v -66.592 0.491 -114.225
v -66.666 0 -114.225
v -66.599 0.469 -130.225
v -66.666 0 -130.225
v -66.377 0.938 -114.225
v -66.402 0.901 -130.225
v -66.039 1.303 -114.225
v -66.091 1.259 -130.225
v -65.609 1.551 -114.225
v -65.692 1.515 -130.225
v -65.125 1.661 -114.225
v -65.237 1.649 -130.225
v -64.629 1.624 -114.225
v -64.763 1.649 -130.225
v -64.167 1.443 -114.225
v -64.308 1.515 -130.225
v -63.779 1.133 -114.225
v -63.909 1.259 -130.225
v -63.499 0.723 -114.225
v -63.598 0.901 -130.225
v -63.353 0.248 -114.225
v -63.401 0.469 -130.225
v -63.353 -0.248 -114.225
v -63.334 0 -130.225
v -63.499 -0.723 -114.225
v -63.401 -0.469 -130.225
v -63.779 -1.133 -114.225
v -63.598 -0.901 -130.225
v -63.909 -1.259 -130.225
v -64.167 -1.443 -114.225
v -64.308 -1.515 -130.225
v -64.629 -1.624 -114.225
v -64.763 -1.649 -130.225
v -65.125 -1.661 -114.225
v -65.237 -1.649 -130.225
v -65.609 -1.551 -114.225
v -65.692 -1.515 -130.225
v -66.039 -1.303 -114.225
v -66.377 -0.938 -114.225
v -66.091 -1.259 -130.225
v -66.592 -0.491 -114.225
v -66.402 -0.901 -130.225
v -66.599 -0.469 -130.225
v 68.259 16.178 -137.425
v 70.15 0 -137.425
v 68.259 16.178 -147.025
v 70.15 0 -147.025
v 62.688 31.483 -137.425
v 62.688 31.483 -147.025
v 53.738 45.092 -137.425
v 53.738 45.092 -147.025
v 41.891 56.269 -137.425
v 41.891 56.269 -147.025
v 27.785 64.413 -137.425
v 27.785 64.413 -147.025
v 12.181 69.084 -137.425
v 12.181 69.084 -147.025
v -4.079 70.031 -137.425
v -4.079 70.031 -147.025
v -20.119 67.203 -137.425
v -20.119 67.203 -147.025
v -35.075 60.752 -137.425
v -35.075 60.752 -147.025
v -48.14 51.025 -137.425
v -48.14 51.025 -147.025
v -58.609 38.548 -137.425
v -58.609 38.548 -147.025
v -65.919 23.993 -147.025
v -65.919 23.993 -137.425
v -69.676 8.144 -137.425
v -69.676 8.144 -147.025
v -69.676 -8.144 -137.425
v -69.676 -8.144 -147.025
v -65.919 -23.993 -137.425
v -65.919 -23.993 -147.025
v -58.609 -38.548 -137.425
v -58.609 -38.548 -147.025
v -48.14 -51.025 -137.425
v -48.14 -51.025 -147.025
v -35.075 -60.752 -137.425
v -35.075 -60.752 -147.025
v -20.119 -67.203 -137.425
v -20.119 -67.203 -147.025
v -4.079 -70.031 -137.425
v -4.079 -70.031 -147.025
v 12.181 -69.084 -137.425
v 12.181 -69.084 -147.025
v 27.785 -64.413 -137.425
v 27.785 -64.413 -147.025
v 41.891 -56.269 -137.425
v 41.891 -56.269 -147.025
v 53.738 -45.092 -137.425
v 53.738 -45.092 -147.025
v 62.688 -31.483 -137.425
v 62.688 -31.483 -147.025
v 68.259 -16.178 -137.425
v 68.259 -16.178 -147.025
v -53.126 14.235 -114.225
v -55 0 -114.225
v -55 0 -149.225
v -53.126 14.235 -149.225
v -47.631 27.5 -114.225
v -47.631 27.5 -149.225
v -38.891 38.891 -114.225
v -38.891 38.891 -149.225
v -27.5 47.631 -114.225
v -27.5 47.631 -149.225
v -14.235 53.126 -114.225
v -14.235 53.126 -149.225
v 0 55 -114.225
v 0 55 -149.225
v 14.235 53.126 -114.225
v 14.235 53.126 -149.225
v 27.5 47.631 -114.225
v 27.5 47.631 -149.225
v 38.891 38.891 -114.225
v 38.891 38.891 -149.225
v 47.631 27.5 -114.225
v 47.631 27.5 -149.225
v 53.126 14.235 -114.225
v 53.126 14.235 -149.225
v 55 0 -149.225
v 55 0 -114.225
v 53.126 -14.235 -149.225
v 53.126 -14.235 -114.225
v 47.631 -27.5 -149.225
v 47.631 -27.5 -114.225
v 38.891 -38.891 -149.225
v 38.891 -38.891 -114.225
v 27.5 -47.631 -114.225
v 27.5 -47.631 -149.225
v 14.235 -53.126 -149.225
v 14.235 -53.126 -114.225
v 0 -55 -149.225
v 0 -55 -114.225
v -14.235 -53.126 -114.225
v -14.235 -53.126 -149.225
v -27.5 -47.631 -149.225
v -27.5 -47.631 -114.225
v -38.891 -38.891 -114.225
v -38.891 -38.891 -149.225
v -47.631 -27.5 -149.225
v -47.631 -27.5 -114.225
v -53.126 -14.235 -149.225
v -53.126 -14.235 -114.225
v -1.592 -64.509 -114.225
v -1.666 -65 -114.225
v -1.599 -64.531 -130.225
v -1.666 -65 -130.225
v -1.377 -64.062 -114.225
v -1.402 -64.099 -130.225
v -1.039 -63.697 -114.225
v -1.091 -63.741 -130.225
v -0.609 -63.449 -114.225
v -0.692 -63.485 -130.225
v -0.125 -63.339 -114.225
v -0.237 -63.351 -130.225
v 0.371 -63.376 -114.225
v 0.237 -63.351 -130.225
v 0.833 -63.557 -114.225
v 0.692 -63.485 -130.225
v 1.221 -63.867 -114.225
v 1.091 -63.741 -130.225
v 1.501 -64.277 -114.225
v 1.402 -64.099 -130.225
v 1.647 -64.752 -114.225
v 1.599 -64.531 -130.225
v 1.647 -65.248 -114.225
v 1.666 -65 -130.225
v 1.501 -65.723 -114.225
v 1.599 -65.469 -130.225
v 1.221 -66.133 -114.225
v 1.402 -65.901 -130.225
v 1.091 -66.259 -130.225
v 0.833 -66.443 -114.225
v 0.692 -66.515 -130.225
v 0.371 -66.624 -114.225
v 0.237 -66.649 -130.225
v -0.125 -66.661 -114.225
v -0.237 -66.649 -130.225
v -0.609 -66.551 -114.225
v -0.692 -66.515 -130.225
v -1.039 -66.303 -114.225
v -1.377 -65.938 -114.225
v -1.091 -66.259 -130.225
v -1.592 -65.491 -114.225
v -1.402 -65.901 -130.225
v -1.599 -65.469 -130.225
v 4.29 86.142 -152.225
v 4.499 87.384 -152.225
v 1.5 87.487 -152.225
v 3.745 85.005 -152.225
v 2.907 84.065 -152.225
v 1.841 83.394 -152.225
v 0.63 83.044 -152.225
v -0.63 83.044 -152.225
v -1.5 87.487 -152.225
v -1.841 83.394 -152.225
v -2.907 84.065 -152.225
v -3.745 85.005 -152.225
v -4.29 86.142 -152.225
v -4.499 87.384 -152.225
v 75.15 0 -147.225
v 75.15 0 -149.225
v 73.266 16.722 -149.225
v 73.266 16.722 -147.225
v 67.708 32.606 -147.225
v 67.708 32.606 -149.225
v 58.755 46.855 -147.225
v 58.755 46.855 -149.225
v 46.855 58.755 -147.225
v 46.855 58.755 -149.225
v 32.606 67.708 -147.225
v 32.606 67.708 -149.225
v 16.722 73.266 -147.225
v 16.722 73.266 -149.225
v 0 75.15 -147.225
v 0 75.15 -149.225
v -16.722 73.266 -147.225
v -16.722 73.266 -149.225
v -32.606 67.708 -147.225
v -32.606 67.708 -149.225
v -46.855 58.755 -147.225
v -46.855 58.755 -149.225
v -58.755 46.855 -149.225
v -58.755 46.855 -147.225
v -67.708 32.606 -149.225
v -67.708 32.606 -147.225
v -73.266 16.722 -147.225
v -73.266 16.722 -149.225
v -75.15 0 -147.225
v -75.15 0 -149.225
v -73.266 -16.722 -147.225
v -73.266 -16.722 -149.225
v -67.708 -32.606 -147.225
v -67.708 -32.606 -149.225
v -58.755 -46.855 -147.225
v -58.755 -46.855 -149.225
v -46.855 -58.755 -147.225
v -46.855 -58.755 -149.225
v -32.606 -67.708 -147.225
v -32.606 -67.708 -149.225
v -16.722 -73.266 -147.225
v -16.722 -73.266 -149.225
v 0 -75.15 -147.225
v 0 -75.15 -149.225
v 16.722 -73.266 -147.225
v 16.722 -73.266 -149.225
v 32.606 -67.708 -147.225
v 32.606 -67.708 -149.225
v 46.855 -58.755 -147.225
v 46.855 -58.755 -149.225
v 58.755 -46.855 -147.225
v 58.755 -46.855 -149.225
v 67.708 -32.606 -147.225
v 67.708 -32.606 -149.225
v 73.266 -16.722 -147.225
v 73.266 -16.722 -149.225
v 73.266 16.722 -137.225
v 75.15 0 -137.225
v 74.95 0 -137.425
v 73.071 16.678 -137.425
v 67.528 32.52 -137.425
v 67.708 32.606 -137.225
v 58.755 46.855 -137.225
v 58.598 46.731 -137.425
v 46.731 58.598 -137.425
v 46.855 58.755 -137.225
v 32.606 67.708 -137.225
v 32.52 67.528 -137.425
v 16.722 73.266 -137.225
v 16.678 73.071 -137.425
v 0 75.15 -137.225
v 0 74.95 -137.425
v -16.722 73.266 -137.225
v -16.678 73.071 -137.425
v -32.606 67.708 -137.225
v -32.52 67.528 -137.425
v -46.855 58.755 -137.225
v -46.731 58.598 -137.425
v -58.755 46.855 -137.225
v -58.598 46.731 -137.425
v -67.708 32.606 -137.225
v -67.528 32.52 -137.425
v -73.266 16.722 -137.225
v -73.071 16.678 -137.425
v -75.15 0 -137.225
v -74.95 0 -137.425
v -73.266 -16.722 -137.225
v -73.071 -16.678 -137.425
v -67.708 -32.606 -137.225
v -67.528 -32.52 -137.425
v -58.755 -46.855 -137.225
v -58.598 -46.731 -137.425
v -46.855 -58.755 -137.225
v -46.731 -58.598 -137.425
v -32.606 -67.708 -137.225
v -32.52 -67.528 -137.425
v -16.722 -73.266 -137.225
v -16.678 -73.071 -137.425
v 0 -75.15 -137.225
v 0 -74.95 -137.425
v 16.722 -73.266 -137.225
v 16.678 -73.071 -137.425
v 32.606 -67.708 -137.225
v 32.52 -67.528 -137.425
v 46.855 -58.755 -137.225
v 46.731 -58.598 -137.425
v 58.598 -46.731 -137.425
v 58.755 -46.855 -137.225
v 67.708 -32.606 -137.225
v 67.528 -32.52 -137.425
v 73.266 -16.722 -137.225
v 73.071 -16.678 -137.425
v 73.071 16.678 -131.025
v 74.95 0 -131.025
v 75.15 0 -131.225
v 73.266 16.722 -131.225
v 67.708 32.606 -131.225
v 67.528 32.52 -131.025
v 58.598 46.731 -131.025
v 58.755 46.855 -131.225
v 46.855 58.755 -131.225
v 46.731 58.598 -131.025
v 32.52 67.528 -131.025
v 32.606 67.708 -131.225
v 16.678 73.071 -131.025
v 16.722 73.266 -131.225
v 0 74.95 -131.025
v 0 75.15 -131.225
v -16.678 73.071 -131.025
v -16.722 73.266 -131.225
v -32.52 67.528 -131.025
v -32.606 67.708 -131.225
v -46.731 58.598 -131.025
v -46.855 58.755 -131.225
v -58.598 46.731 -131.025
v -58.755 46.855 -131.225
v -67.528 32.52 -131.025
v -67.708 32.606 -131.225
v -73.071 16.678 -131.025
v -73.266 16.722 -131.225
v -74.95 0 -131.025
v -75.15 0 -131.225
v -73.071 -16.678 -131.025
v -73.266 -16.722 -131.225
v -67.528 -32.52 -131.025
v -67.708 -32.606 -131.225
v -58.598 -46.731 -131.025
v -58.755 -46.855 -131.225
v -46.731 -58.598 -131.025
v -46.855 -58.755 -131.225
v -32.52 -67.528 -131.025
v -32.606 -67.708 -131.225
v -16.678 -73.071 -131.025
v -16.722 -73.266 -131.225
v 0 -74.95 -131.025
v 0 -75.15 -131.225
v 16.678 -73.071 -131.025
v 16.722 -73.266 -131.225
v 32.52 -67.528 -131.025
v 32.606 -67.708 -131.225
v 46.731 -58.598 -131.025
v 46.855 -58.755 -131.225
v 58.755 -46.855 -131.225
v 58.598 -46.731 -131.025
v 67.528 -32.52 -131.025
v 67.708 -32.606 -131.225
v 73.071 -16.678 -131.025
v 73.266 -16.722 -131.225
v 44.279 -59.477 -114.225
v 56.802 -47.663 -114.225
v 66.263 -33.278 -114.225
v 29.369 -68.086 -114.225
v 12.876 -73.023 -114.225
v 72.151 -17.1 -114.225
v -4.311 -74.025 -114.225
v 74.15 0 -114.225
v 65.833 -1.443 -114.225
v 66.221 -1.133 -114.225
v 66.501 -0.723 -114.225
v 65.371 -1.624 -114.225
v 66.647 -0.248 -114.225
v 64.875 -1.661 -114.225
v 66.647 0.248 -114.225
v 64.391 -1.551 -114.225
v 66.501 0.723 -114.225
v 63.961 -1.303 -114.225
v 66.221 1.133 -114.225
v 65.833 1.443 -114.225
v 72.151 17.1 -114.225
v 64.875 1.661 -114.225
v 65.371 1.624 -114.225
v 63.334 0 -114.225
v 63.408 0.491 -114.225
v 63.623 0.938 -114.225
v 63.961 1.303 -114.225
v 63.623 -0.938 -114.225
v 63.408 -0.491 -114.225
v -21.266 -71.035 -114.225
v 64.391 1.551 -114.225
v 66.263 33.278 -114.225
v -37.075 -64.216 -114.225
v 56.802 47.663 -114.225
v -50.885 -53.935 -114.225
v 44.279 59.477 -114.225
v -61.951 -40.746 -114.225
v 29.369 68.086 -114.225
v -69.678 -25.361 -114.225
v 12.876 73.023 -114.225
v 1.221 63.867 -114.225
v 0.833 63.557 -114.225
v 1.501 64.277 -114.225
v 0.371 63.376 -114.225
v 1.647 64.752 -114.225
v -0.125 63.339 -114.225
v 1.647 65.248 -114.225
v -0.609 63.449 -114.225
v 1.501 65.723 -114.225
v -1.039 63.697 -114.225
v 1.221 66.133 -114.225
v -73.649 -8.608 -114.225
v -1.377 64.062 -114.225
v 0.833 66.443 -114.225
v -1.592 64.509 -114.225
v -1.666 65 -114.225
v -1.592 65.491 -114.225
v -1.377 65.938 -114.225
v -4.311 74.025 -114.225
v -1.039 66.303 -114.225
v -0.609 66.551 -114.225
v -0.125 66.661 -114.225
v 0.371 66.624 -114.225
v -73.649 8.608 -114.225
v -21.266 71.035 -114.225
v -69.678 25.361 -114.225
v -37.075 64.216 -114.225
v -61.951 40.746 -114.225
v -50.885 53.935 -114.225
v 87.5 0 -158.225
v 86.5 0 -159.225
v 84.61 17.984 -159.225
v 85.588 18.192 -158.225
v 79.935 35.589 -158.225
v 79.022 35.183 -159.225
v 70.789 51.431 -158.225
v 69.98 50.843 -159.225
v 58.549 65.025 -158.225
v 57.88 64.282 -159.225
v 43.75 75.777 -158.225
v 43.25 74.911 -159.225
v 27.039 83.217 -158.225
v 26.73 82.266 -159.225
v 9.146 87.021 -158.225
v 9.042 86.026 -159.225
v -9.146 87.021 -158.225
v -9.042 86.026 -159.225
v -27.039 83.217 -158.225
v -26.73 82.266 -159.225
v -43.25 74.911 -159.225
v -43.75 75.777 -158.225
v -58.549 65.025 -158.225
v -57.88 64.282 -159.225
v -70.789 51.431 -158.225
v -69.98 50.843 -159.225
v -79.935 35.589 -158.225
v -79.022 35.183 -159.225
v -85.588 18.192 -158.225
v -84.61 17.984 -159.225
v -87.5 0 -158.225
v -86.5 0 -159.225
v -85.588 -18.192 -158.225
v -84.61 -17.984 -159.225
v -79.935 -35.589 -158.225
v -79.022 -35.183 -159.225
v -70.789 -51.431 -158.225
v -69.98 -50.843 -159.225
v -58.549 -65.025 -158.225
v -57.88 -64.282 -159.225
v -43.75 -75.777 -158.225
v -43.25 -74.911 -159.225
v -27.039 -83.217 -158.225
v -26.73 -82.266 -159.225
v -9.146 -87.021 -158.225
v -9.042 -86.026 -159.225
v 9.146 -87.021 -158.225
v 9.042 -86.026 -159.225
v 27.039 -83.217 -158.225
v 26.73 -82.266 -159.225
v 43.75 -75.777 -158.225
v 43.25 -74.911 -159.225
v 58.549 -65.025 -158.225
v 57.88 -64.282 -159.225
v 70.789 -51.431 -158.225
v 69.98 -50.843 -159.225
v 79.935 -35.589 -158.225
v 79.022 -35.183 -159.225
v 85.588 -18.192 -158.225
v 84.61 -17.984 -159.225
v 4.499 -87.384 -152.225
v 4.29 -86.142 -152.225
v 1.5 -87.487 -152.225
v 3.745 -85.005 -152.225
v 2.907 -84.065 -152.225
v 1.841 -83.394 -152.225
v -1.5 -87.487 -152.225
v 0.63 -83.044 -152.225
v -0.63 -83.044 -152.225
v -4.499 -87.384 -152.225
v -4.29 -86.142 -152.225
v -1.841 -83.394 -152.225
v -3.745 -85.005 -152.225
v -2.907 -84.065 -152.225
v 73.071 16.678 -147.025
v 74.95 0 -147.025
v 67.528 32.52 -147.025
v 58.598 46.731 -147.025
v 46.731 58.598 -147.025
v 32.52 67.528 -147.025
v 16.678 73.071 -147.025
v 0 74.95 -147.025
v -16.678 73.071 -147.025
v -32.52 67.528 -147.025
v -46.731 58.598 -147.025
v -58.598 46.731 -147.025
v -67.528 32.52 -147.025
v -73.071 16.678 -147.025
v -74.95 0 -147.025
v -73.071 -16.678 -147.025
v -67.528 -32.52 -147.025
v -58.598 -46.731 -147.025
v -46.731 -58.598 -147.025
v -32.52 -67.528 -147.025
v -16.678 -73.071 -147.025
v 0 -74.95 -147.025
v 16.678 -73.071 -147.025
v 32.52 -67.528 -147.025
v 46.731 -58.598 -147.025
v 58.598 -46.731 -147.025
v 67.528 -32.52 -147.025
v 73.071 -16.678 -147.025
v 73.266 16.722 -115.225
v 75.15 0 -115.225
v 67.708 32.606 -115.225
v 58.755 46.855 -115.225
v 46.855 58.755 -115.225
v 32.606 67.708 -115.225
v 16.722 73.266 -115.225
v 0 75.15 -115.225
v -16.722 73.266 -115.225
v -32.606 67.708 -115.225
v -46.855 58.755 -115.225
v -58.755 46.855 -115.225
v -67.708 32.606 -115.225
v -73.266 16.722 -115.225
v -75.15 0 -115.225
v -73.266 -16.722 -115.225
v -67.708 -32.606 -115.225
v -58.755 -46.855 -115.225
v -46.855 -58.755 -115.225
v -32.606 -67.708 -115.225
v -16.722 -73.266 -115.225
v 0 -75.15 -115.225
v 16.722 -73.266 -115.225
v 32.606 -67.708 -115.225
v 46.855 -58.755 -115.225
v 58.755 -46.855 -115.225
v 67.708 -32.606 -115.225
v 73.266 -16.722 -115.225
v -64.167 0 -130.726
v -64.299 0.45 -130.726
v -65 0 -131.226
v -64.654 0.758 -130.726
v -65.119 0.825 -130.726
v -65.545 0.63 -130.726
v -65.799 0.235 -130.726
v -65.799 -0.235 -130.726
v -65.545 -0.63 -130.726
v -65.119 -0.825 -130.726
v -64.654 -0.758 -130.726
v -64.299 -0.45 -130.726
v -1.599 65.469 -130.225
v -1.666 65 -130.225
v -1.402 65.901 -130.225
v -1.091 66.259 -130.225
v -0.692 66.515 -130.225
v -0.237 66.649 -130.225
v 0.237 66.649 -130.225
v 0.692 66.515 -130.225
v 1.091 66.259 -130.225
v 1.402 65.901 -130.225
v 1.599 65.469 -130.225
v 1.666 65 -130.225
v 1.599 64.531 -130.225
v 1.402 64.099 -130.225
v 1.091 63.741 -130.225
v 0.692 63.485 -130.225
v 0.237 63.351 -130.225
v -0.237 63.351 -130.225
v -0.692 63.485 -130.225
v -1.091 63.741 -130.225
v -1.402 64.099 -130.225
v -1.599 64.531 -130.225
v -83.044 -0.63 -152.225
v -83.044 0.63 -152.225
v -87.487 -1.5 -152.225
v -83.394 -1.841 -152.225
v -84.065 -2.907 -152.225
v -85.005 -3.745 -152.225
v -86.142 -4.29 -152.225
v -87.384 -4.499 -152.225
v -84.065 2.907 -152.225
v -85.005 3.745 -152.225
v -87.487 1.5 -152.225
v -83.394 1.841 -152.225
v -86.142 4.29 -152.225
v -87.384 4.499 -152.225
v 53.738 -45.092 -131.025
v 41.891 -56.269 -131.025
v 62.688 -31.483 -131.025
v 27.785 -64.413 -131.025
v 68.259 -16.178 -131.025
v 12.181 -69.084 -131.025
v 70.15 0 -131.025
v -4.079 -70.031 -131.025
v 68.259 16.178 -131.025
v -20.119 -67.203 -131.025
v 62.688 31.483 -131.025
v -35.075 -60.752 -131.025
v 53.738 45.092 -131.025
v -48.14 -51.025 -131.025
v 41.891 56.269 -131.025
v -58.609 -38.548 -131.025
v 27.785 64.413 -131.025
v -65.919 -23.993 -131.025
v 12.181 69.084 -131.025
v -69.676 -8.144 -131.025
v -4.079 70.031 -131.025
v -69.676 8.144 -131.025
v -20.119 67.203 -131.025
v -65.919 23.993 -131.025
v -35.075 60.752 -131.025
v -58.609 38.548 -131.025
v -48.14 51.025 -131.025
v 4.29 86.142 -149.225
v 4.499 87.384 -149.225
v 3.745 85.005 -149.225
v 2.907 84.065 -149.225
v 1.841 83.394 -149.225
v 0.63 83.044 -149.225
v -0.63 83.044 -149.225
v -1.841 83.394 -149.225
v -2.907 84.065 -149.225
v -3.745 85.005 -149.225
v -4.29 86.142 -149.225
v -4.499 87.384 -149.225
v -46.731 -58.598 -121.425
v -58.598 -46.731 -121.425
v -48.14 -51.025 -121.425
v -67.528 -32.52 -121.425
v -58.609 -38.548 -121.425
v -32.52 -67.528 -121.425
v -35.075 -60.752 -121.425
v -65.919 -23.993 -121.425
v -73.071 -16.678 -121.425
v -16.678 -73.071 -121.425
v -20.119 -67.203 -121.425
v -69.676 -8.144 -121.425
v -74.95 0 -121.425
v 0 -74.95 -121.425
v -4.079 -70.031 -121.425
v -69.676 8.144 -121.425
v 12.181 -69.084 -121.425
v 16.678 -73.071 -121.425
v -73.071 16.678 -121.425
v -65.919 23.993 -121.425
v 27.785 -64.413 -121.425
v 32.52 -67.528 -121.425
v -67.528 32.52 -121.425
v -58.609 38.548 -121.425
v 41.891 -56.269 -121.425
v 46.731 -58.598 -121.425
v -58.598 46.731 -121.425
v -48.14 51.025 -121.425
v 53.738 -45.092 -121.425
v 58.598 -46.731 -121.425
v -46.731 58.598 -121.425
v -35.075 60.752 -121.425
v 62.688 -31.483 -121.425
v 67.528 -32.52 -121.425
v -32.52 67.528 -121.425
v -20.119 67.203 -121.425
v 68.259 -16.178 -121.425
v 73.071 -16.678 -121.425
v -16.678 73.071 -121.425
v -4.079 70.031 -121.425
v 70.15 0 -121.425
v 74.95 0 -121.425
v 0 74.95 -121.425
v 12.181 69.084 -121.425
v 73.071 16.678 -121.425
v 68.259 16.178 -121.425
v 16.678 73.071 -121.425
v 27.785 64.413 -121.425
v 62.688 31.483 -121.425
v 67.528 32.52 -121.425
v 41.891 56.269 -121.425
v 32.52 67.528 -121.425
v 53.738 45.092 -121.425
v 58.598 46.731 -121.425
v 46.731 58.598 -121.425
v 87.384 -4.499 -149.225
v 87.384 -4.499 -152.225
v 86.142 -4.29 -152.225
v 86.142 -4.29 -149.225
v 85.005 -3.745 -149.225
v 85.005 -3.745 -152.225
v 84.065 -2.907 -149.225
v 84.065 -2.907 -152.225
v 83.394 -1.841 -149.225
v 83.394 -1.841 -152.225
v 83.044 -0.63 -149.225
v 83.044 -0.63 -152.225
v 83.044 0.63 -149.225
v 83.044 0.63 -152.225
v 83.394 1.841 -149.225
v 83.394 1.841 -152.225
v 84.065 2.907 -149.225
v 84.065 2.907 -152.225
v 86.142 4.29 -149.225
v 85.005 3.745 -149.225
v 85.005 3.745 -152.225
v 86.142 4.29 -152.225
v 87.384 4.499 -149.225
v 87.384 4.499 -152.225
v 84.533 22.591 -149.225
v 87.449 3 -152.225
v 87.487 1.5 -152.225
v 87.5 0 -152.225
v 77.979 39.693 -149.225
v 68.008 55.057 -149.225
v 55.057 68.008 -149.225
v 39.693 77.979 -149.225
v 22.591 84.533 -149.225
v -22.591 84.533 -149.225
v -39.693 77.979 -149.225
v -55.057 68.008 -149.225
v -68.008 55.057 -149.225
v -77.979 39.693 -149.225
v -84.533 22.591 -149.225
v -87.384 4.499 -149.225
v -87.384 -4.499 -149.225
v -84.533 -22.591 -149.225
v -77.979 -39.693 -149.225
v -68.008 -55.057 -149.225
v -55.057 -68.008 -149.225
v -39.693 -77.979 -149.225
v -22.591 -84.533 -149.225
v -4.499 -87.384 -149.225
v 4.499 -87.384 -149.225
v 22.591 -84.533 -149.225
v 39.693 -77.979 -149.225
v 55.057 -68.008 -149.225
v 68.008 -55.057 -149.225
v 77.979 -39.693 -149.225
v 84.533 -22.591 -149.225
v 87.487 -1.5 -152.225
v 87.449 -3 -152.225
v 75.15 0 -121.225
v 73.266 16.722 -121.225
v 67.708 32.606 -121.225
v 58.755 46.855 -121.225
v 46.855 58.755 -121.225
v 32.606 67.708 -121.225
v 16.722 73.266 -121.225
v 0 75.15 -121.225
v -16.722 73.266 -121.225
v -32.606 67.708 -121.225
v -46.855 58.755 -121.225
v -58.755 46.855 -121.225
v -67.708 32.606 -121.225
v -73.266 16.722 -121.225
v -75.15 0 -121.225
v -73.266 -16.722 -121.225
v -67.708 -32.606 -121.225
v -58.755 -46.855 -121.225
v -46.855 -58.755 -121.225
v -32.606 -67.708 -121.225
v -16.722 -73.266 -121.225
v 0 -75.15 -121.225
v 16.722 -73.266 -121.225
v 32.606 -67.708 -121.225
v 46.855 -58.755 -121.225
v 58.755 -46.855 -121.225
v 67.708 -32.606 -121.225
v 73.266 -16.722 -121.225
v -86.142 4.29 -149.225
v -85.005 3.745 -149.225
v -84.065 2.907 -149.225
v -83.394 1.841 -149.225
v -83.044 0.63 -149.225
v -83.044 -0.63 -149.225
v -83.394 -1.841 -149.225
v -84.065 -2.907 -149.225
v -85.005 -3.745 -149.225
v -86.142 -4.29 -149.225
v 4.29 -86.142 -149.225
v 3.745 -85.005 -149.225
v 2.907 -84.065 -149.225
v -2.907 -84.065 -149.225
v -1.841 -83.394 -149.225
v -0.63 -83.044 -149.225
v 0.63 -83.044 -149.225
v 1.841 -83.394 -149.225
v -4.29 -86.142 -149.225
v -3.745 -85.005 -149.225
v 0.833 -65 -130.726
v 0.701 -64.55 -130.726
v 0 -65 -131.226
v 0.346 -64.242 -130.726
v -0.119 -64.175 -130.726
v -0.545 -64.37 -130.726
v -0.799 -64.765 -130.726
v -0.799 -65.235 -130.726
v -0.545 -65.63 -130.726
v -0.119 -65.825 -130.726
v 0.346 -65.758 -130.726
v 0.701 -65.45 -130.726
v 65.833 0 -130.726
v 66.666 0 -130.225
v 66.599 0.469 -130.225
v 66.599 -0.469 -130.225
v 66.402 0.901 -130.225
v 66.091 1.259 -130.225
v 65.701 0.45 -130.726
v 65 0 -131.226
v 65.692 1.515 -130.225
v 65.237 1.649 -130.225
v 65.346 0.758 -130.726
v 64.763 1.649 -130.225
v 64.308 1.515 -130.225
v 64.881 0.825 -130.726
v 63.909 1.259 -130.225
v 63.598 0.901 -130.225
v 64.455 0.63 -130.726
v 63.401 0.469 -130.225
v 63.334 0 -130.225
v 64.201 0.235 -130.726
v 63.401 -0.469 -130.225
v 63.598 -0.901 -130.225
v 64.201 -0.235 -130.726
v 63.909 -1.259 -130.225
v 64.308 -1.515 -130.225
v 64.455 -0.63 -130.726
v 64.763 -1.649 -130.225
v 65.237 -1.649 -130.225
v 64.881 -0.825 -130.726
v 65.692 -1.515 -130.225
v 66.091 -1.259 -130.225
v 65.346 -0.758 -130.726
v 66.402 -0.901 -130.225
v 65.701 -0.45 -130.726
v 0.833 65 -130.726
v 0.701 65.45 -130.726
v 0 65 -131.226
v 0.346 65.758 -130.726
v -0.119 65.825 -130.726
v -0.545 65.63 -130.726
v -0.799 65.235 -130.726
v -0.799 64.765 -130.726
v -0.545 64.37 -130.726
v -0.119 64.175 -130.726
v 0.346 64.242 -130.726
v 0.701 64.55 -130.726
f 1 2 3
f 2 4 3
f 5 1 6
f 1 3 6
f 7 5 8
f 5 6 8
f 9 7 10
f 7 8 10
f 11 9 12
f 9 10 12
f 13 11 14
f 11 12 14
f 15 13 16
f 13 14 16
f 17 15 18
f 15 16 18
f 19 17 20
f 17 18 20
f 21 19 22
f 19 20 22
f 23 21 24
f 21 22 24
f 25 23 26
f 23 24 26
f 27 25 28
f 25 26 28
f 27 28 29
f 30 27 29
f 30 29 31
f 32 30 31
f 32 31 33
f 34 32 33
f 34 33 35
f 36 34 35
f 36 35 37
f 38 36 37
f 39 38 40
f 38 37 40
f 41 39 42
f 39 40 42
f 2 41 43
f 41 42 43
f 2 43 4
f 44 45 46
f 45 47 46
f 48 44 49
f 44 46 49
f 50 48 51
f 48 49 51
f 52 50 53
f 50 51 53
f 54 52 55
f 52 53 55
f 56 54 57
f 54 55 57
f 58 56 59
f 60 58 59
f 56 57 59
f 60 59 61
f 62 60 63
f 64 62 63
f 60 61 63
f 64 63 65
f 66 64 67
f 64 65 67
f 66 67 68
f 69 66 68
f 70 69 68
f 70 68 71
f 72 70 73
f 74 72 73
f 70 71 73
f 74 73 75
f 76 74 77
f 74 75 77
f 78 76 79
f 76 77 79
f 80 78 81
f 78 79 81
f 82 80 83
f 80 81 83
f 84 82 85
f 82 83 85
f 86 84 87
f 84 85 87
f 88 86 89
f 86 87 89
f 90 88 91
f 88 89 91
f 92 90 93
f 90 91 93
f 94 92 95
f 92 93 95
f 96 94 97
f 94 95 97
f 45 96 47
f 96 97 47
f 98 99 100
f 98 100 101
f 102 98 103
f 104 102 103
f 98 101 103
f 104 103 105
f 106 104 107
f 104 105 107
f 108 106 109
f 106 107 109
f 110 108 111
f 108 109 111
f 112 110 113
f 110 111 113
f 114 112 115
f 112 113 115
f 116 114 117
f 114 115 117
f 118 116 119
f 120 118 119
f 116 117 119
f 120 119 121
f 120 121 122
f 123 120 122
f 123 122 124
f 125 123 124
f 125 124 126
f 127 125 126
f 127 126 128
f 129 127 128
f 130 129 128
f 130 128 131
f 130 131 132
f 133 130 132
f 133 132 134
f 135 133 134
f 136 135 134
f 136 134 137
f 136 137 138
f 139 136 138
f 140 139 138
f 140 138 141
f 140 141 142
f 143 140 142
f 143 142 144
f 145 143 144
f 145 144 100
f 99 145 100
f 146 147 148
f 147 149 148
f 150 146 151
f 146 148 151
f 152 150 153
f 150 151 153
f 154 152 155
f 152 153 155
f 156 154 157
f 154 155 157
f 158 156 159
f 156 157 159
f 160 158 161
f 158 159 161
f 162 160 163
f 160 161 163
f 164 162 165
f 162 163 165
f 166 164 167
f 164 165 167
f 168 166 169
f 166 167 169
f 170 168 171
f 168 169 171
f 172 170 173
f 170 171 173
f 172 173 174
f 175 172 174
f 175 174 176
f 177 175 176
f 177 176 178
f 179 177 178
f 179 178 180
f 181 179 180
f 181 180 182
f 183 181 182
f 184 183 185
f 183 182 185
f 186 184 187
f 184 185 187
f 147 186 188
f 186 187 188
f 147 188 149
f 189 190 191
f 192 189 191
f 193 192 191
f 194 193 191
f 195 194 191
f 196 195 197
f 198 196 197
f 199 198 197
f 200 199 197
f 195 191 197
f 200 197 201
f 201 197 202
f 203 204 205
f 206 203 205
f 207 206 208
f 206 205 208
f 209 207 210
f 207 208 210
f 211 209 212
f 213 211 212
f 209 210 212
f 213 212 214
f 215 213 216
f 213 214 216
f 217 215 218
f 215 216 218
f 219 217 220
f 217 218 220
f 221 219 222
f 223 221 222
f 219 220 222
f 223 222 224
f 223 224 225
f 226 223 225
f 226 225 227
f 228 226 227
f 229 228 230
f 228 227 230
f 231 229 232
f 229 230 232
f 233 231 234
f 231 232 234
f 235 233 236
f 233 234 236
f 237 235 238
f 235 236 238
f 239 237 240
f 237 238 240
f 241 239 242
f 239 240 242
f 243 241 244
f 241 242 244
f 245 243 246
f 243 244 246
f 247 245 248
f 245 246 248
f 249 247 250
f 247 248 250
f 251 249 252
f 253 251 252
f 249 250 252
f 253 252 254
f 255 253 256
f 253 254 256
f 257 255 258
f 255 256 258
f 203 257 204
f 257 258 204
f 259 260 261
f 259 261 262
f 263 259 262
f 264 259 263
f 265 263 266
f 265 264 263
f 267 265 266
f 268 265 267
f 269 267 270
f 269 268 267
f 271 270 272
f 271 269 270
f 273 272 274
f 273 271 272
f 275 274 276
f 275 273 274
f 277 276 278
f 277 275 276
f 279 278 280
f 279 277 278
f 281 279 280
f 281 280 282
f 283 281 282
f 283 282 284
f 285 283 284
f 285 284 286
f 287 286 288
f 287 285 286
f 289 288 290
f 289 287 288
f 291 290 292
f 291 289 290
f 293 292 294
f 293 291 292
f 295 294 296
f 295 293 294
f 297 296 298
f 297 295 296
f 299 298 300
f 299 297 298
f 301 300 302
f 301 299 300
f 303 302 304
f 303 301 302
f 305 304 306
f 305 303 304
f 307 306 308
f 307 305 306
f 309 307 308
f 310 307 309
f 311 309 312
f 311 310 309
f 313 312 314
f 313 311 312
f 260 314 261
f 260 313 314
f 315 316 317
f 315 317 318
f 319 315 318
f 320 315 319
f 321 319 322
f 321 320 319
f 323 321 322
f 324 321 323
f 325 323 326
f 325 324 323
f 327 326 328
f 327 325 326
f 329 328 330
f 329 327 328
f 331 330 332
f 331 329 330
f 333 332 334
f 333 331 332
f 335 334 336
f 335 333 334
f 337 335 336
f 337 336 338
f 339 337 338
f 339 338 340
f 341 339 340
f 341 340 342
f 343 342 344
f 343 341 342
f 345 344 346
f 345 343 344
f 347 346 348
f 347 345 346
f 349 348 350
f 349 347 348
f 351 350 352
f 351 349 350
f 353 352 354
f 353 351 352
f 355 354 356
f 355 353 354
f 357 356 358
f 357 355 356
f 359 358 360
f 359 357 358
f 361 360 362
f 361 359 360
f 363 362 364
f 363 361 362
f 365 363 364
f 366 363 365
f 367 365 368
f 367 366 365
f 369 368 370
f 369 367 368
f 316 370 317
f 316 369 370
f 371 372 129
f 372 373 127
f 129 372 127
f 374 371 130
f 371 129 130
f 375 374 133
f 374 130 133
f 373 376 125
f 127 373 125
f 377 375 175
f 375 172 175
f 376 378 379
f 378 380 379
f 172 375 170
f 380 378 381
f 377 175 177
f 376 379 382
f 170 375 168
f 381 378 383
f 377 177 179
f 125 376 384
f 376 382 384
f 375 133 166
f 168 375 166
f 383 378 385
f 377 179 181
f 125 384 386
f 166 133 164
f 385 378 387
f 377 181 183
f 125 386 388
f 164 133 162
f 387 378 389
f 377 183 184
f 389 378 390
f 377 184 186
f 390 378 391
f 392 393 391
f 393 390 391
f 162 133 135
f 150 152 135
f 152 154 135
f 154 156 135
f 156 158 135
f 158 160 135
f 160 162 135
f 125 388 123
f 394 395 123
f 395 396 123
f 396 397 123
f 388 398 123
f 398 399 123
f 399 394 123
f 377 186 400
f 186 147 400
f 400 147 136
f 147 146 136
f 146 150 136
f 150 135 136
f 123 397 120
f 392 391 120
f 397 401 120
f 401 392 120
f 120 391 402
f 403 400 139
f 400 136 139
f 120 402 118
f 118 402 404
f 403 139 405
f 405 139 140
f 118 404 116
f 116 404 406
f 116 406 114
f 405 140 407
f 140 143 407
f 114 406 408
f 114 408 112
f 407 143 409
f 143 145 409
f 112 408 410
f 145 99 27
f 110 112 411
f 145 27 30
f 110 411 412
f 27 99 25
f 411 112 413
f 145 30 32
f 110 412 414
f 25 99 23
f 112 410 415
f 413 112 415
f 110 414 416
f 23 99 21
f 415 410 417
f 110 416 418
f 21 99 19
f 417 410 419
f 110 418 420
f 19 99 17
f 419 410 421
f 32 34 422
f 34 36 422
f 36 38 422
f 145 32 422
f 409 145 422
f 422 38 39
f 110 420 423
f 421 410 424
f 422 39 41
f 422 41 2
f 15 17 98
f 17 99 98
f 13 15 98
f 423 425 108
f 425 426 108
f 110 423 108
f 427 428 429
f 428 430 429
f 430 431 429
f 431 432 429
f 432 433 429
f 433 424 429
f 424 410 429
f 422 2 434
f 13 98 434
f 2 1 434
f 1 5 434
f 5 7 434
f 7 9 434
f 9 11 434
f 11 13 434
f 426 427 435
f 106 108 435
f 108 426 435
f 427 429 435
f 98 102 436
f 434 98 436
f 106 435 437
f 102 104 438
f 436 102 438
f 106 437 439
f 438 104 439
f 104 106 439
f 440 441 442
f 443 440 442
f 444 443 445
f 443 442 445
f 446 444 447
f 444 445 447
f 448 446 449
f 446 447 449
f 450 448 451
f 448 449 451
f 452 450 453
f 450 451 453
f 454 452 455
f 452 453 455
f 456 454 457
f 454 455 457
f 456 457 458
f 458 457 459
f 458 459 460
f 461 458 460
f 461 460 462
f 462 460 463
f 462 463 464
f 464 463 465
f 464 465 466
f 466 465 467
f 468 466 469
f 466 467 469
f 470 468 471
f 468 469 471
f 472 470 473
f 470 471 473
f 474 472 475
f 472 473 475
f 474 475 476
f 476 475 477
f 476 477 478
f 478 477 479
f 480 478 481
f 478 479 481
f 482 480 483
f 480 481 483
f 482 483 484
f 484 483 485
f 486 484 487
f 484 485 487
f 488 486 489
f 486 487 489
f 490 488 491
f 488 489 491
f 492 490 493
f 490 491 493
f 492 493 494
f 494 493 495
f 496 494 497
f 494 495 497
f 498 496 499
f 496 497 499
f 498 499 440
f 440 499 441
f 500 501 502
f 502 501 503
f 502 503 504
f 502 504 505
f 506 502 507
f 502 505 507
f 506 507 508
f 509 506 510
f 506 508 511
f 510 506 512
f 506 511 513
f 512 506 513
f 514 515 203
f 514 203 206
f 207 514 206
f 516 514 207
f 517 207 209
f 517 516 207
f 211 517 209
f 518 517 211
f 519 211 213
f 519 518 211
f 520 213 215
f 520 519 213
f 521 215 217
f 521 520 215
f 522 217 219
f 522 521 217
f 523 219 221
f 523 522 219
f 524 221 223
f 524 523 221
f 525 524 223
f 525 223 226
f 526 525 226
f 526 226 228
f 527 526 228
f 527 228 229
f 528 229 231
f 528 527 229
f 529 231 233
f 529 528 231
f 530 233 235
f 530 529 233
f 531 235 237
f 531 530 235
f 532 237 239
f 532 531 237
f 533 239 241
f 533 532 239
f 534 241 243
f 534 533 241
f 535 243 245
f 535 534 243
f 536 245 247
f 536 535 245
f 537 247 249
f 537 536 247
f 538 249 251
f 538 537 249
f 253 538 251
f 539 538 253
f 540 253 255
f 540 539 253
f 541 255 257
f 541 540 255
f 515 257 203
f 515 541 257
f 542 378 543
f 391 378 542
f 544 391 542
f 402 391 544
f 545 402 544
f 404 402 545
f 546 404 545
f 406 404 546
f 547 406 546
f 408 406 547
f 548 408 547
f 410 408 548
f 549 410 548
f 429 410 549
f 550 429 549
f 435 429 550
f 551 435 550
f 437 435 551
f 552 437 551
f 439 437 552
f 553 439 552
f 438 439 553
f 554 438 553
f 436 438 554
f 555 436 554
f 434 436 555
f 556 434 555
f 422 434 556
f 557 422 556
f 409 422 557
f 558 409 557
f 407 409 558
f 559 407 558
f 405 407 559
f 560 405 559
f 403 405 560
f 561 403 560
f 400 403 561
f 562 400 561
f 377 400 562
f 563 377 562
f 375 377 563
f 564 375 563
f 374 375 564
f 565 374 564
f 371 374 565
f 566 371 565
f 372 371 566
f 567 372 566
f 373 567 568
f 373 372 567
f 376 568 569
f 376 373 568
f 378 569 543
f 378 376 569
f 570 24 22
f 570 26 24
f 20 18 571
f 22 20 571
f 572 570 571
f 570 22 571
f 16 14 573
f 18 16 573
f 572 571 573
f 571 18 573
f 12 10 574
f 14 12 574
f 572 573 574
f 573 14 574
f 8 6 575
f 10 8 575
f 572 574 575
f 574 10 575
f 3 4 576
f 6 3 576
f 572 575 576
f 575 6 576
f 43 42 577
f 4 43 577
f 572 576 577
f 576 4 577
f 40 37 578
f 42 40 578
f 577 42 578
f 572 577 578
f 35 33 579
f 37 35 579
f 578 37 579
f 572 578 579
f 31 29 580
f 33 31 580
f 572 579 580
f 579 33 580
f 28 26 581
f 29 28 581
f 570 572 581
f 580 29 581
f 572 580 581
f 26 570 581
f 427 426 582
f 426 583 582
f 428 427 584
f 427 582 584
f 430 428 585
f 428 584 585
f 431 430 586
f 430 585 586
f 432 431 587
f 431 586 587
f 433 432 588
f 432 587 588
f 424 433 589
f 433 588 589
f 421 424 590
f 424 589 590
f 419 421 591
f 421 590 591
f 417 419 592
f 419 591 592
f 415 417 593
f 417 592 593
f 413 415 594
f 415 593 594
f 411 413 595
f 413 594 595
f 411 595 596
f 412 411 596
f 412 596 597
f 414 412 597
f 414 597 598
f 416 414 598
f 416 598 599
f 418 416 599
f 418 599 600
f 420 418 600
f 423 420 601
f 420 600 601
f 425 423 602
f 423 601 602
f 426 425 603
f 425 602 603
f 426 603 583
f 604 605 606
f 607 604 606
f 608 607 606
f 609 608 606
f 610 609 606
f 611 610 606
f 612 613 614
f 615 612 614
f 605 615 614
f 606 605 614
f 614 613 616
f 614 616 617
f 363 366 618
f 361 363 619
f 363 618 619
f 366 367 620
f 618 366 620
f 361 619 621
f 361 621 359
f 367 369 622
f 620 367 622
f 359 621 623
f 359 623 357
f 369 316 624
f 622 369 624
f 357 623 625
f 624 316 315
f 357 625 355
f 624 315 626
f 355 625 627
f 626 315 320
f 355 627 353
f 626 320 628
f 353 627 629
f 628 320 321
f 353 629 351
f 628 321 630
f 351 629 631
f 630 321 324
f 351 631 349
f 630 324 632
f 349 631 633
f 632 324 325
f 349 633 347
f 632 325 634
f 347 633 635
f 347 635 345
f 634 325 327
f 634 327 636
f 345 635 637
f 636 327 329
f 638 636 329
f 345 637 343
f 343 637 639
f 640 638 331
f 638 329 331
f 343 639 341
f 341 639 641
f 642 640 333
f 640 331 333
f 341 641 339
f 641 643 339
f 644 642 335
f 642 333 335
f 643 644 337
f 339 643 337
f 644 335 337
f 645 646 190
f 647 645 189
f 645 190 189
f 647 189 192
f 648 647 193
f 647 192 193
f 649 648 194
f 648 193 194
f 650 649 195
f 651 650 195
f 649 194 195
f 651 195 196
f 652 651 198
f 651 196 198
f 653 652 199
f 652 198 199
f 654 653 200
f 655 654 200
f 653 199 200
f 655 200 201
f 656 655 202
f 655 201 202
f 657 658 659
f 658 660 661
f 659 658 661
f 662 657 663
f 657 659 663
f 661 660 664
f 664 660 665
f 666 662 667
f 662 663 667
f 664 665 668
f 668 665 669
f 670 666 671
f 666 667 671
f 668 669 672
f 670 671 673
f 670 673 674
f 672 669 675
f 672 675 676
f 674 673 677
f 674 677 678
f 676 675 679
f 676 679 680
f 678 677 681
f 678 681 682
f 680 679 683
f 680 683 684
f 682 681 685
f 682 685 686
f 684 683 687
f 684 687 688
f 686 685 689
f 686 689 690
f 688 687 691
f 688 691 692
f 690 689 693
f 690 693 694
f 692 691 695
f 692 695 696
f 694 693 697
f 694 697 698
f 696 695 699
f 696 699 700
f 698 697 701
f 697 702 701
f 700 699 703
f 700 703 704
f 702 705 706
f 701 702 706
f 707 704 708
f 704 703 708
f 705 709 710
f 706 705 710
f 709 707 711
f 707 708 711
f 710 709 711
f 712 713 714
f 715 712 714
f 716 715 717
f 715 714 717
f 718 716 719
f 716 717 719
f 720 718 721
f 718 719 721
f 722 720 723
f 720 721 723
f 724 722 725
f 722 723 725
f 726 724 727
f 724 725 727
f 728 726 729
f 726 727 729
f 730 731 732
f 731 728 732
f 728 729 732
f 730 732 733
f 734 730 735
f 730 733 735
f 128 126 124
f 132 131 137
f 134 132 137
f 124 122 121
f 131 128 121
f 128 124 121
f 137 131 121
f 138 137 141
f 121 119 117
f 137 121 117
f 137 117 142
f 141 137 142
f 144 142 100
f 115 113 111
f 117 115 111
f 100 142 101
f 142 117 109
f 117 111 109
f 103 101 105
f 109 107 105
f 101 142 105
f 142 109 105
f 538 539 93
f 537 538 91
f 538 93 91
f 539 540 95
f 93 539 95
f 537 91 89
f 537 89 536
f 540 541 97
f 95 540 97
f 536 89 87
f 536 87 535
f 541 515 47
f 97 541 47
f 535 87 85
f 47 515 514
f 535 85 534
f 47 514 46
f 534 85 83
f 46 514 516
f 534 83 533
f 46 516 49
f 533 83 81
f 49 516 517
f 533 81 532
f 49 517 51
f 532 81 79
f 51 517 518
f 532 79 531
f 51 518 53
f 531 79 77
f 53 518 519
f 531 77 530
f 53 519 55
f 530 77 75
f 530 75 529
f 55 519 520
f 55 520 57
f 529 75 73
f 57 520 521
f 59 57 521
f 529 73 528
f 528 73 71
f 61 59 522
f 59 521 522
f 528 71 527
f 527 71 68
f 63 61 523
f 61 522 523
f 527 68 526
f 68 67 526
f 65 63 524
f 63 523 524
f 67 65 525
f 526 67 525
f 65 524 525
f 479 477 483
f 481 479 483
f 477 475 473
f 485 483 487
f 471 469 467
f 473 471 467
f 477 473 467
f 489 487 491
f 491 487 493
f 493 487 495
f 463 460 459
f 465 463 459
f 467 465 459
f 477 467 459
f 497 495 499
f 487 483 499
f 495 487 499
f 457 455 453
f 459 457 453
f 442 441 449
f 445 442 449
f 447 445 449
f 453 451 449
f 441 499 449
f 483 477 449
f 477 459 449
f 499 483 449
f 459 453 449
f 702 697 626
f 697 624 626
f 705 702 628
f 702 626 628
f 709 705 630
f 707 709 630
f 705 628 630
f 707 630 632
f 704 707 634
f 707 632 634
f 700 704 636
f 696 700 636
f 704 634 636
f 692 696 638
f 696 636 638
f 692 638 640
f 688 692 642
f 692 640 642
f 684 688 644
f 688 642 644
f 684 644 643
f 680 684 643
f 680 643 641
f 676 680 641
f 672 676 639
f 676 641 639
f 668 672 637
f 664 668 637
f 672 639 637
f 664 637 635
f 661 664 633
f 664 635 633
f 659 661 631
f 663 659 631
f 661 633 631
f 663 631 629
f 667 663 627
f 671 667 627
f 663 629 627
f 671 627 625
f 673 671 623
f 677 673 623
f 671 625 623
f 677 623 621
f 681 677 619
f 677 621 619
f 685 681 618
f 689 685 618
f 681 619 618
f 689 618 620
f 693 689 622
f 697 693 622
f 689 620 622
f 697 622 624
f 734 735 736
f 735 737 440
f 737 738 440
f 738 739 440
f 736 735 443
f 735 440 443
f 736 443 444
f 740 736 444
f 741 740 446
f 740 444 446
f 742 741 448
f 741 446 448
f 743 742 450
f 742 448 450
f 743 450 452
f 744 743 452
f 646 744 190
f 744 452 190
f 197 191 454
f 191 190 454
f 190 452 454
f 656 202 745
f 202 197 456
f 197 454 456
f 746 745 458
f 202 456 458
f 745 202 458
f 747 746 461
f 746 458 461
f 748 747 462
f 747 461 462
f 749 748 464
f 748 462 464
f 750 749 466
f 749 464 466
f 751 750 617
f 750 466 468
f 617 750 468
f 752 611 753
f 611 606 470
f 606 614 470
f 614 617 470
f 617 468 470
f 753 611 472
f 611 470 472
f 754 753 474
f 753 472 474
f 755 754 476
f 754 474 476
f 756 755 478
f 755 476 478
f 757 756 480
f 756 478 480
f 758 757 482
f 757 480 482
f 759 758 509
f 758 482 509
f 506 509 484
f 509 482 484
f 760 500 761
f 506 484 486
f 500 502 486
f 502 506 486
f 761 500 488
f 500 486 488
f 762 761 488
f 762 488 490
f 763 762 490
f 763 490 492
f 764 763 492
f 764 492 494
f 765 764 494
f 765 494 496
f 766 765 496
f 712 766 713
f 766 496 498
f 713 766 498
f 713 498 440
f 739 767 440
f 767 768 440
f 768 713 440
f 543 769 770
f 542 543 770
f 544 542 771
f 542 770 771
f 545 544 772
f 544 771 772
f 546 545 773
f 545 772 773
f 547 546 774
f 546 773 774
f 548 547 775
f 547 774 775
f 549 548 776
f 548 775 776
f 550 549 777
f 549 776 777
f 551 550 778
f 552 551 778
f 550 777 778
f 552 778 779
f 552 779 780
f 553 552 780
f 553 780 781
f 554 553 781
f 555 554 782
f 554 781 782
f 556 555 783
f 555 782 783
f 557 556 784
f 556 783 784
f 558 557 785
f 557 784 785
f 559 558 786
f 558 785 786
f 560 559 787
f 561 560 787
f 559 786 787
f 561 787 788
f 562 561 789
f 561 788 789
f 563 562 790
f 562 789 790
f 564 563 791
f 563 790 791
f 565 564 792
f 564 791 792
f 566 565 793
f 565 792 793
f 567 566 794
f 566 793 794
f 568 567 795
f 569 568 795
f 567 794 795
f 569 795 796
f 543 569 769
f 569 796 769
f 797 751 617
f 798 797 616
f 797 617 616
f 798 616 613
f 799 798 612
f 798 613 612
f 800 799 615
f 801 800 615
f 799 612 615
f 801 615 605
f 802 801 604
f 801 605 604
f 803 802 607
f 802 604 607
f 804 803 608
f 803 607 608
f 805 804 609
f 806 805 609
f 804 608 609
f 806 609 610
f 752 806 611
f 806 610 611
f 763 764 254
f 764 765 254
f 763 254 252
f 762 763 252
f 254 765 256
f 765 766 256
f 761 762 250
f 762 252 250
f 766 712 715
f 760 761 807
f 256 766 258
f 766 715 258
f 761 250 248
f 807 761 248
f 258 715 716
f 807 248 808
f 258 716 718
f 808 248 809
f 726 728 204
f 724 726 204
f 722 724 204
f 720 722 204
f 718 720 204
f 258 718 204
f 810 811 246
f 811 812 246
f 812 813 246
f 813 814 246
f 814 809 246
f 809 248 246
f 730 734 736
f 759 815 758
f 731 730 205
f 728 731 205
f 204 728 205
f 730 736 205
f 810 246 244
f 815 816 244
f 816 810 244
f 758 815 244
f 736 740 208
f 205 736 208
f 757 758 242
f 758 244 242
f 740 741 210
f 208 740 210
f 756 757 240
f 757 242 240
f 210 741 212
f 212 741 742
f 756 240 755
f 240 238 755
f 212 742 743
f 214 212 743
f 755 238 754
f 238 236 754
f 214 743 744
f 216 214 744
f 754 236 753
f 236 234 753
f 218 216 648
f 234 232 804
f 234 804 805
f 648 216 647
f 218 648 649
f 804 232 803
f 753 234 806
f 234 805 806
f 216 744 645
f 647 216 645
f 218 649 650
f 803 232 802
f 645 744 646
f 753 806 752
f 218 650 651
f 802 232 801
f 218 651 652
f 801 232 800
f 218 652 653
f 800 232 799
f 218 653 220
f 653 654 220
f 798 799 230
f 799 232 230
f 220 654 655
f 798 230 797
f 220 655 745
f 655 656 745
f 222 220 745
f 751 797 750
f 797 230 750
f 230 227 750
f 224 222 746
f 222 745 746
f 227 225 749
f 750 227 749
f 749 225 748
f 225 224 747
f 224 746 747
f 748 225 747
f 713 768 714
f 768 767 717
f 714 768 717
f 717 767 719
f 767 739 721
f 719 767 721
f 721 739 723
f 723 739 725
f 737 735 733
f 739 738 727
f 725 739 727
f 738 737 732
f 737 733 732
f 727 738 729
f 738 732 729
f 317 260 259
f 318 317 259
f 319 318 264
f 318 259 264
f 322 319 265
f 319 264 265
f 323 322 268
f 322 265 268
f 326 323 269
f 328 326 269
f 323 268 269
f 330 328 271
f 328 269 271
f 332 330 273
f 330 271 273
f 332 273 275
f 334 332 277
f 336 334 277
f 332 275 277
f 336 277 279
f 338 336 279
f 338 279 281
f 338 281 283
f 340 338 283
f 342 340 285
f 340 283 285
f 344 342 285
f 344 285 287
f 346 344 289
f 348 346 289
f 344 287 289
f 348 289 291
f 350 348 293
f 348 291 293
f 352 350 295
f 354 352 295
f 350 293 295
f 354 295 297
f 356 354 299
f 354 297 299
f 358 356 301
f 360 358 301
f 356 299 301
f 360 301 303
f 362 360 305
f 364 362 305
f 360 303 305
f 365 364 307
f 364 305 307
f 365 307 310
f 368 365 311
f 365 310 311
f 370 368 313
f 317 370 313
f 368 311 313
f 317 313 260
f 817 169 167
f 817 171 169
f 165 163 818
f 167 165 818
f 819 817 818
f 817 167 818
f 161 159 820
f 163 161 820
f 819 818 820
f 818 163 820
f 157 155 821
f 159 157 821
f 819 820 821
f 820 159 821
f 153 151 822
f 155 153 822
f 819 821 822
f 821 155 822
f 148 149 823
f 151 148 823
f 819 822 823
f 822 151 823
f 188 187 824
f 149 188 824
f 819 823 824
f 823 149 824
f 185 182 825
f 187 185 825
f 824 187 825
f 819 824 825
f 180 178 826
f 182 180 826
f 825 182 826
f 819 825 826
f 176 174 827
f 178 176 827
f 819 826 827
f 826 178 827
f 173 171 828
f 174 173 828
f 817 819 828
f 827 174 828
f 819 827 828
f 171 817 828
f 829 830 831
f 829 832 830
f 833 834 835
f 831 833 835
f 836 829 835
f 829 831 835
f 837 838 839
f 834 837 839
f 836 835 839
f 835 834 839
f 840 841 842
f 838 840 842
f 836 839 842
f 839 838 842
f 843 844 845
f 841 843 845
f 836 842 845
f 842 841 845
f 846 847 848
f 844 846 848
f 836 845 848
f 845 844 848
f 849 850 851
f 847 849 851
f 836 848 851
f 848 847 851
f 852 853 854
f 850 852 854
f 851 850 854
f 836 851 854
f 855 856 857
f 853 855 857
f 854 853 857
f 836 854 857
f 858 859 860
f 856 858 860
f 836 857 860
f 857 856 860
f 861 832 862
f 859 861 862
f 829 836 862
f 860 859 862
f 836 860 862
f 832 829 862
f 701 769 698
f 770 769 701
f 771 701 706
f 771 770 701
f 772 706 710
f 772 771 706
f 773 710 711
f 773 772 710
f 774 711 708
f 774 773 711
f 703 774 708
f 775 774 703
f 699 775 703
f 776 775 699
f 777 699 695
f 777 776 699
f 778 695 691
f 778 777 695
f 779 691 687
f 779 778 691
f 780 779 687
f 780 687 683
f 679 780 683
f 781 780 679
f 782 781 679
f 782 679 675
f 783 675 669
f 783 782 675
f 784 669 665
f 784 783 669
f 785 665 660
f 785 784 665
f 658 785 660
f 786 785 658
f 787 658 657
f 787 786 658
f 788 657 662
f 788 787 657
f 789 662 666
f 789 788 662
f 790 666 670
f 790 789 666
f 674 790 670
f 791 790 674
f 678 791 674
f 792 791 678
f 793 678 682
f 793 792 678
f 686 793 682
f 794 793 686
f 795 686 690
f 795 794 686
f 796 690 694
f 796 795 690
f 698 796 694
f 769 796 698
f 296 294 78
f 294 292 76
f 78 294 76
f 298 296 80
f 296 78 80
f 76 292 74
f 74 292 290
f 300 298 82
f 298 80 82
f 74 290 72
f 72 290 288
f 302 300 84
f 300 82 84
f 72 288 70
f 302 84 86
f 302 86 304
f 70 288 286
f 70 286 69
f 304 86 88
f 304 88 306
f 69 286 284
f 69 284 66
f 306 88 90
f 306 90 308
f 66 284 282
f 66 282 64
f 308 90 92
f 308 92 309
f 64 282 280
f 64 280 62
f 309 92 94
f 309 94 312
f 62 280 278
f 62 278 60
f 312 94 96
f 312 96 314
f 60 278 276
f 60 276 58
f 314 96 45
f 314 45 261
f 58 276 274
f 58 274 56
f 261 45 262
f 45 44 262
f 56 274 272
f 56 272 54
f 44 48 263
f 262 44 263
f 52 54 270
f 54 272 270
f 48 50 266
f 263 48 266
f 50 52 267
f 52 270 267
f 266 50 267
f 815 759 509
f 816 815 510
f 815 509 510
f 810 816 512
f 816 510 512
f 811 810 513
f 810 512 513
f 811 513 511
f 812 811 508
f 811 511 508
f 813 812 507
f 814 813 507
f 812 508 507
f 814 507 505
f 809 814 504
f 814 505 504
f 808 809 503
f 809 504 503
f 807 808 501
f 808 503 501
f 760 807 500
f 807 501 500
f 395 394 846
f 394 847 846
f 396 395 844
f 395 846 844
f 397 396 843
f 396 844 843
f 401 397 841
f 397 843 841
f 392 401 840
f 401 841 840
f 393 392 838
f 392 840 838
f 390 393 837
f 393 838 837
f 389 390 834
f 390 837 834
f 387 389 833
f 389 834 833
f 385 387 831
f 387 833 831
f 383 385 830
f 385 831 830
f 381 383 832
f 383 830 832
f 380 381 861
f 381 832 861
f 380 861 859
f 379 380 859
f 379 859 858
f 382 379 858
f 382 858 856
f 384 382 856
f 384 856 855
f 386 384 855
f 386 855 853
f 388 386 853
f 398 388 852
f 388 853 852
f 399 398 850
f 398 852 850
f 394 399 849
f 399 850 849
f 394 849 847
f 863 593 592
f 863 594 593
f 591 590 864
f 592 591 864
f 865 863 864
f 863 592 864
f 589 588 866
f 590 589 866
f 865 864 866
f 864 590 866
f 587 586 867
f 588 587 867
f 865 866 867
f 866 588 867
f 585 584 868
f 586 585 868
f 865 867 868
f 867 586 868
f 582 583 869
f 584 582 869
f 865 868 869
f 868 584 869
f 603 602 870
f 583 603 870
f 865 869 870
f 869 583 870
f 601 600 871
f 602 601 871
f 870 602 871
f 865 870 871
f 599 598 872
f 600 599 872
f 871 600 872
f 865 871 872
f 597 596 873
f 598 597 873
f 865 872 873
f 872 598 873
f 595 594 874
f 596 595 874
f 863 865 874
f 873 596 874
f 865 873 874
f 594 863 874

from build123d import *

# Parameters (mm, degrees)
DIAM_TRE_DU_PER_AGE_9_0_9_1_D     = 9
DIAM_TRE_DU_PER_AGE_9_0_9_1_DEPTH = 3
D_GAGEMENT_M31_D                  = 3.332
D_GAGEMENT_M31_DEPTH              = 16
D_GAGEMENT_M31_TIP                = 1.001033791
D_GAGEMENT_M1001_D                = 110
D_GAGEMENT_M1001_DEPTH            = 35
CHANFREIN1_SIZE                   = 0.2
CHANFREIN2_SIZE                   = 1


with BuildPart() as part:
    # Esquisse1 → Révolution1 (revolve)
    with BuildSketch(Plane(origin=(0, 0, 0), x_dir=(1, 0, 0), z_dir=(0, 1, 0))):
        Polygon((87.5, 159.225), (0, 159.225), (0, 114.225), (75.15, 114.225), (75.15, 121.425), (70.15, 121.425), (70.15, 131.025), (75.15, 131.025), (75.15, 137.425), (70.15, 137.425), (70.15, 147.025), (75.15, 147.025), (75.15, 149.225), (87.5, 149.225), align=None)
    revolve(axis=Axis((0, 0, -159.225), (0, 0, 1)))

    # Diamètre du perçage Ø9.0 (9)1
    with Locations(Plane.XY.offset(-149.225)):
        with Locations((-87.5, 0), (0, 87.5), (0, -87.5), (87.5, 0)):
            Hole(DIAM_TRE_DU_PER_AGE_9_0_9_1_D / 2, depth=DIAM_TRE_DU_PER_AGE_9_0_9_1_DEPTH)

    # Dégagement M31
    with Locations(Plane.XY.offset(-114.225)):
        with Locations((-65, 0), (65, 0), (0, 65), (0, -65)):
            Hole(D_GAGEMENT_M31_D / 2, depth=D_GAGEMENT_M31_DEPTH)
            with Locations((0, 0, -(D_GAGEMENT_M31_DEPTH + D_GAGEMENT_M31_TIP / 2))):  # 118° drill point
                Cone(0, D_GAGEMENT_M31_D / 2, D_GAGEMENT_M31_TIP, mode=Mode.SUBTRACT)

    # Dégagement M1001
    with Locations(Plane.XY.offset(-114.225)):
        with Locations((0, 0)):
            Hole(D_GAGEMENT_M1001_D / 2, depth=D_GAGEMENT_M1001_DEPTH)

    # Chanfrein1
    chanfrein1_edges = [part.edges().sort_by_distance(p)[0] for p in [
        (-75.15, 0, -147.025),
        (-75.15, 0, -137.425),
        (-75.15, 0, -131.025),
        (-75.15, 0, -121.425),
    ]]
    chamfer(chanfrein1_edges, length=CHANFREIN1_SIZE)

    # Chanfrein2
    chanfrein2_edges = [part.edges().sort_by_distance(p)[0] for p in [
        (-75.15, 0, -114.225),
        (-87.5, 0, -159.225),
    ]]
    chamfer(chanfrein2_edges, length=CHANFREIN2_SIZE)


solid = part.part
